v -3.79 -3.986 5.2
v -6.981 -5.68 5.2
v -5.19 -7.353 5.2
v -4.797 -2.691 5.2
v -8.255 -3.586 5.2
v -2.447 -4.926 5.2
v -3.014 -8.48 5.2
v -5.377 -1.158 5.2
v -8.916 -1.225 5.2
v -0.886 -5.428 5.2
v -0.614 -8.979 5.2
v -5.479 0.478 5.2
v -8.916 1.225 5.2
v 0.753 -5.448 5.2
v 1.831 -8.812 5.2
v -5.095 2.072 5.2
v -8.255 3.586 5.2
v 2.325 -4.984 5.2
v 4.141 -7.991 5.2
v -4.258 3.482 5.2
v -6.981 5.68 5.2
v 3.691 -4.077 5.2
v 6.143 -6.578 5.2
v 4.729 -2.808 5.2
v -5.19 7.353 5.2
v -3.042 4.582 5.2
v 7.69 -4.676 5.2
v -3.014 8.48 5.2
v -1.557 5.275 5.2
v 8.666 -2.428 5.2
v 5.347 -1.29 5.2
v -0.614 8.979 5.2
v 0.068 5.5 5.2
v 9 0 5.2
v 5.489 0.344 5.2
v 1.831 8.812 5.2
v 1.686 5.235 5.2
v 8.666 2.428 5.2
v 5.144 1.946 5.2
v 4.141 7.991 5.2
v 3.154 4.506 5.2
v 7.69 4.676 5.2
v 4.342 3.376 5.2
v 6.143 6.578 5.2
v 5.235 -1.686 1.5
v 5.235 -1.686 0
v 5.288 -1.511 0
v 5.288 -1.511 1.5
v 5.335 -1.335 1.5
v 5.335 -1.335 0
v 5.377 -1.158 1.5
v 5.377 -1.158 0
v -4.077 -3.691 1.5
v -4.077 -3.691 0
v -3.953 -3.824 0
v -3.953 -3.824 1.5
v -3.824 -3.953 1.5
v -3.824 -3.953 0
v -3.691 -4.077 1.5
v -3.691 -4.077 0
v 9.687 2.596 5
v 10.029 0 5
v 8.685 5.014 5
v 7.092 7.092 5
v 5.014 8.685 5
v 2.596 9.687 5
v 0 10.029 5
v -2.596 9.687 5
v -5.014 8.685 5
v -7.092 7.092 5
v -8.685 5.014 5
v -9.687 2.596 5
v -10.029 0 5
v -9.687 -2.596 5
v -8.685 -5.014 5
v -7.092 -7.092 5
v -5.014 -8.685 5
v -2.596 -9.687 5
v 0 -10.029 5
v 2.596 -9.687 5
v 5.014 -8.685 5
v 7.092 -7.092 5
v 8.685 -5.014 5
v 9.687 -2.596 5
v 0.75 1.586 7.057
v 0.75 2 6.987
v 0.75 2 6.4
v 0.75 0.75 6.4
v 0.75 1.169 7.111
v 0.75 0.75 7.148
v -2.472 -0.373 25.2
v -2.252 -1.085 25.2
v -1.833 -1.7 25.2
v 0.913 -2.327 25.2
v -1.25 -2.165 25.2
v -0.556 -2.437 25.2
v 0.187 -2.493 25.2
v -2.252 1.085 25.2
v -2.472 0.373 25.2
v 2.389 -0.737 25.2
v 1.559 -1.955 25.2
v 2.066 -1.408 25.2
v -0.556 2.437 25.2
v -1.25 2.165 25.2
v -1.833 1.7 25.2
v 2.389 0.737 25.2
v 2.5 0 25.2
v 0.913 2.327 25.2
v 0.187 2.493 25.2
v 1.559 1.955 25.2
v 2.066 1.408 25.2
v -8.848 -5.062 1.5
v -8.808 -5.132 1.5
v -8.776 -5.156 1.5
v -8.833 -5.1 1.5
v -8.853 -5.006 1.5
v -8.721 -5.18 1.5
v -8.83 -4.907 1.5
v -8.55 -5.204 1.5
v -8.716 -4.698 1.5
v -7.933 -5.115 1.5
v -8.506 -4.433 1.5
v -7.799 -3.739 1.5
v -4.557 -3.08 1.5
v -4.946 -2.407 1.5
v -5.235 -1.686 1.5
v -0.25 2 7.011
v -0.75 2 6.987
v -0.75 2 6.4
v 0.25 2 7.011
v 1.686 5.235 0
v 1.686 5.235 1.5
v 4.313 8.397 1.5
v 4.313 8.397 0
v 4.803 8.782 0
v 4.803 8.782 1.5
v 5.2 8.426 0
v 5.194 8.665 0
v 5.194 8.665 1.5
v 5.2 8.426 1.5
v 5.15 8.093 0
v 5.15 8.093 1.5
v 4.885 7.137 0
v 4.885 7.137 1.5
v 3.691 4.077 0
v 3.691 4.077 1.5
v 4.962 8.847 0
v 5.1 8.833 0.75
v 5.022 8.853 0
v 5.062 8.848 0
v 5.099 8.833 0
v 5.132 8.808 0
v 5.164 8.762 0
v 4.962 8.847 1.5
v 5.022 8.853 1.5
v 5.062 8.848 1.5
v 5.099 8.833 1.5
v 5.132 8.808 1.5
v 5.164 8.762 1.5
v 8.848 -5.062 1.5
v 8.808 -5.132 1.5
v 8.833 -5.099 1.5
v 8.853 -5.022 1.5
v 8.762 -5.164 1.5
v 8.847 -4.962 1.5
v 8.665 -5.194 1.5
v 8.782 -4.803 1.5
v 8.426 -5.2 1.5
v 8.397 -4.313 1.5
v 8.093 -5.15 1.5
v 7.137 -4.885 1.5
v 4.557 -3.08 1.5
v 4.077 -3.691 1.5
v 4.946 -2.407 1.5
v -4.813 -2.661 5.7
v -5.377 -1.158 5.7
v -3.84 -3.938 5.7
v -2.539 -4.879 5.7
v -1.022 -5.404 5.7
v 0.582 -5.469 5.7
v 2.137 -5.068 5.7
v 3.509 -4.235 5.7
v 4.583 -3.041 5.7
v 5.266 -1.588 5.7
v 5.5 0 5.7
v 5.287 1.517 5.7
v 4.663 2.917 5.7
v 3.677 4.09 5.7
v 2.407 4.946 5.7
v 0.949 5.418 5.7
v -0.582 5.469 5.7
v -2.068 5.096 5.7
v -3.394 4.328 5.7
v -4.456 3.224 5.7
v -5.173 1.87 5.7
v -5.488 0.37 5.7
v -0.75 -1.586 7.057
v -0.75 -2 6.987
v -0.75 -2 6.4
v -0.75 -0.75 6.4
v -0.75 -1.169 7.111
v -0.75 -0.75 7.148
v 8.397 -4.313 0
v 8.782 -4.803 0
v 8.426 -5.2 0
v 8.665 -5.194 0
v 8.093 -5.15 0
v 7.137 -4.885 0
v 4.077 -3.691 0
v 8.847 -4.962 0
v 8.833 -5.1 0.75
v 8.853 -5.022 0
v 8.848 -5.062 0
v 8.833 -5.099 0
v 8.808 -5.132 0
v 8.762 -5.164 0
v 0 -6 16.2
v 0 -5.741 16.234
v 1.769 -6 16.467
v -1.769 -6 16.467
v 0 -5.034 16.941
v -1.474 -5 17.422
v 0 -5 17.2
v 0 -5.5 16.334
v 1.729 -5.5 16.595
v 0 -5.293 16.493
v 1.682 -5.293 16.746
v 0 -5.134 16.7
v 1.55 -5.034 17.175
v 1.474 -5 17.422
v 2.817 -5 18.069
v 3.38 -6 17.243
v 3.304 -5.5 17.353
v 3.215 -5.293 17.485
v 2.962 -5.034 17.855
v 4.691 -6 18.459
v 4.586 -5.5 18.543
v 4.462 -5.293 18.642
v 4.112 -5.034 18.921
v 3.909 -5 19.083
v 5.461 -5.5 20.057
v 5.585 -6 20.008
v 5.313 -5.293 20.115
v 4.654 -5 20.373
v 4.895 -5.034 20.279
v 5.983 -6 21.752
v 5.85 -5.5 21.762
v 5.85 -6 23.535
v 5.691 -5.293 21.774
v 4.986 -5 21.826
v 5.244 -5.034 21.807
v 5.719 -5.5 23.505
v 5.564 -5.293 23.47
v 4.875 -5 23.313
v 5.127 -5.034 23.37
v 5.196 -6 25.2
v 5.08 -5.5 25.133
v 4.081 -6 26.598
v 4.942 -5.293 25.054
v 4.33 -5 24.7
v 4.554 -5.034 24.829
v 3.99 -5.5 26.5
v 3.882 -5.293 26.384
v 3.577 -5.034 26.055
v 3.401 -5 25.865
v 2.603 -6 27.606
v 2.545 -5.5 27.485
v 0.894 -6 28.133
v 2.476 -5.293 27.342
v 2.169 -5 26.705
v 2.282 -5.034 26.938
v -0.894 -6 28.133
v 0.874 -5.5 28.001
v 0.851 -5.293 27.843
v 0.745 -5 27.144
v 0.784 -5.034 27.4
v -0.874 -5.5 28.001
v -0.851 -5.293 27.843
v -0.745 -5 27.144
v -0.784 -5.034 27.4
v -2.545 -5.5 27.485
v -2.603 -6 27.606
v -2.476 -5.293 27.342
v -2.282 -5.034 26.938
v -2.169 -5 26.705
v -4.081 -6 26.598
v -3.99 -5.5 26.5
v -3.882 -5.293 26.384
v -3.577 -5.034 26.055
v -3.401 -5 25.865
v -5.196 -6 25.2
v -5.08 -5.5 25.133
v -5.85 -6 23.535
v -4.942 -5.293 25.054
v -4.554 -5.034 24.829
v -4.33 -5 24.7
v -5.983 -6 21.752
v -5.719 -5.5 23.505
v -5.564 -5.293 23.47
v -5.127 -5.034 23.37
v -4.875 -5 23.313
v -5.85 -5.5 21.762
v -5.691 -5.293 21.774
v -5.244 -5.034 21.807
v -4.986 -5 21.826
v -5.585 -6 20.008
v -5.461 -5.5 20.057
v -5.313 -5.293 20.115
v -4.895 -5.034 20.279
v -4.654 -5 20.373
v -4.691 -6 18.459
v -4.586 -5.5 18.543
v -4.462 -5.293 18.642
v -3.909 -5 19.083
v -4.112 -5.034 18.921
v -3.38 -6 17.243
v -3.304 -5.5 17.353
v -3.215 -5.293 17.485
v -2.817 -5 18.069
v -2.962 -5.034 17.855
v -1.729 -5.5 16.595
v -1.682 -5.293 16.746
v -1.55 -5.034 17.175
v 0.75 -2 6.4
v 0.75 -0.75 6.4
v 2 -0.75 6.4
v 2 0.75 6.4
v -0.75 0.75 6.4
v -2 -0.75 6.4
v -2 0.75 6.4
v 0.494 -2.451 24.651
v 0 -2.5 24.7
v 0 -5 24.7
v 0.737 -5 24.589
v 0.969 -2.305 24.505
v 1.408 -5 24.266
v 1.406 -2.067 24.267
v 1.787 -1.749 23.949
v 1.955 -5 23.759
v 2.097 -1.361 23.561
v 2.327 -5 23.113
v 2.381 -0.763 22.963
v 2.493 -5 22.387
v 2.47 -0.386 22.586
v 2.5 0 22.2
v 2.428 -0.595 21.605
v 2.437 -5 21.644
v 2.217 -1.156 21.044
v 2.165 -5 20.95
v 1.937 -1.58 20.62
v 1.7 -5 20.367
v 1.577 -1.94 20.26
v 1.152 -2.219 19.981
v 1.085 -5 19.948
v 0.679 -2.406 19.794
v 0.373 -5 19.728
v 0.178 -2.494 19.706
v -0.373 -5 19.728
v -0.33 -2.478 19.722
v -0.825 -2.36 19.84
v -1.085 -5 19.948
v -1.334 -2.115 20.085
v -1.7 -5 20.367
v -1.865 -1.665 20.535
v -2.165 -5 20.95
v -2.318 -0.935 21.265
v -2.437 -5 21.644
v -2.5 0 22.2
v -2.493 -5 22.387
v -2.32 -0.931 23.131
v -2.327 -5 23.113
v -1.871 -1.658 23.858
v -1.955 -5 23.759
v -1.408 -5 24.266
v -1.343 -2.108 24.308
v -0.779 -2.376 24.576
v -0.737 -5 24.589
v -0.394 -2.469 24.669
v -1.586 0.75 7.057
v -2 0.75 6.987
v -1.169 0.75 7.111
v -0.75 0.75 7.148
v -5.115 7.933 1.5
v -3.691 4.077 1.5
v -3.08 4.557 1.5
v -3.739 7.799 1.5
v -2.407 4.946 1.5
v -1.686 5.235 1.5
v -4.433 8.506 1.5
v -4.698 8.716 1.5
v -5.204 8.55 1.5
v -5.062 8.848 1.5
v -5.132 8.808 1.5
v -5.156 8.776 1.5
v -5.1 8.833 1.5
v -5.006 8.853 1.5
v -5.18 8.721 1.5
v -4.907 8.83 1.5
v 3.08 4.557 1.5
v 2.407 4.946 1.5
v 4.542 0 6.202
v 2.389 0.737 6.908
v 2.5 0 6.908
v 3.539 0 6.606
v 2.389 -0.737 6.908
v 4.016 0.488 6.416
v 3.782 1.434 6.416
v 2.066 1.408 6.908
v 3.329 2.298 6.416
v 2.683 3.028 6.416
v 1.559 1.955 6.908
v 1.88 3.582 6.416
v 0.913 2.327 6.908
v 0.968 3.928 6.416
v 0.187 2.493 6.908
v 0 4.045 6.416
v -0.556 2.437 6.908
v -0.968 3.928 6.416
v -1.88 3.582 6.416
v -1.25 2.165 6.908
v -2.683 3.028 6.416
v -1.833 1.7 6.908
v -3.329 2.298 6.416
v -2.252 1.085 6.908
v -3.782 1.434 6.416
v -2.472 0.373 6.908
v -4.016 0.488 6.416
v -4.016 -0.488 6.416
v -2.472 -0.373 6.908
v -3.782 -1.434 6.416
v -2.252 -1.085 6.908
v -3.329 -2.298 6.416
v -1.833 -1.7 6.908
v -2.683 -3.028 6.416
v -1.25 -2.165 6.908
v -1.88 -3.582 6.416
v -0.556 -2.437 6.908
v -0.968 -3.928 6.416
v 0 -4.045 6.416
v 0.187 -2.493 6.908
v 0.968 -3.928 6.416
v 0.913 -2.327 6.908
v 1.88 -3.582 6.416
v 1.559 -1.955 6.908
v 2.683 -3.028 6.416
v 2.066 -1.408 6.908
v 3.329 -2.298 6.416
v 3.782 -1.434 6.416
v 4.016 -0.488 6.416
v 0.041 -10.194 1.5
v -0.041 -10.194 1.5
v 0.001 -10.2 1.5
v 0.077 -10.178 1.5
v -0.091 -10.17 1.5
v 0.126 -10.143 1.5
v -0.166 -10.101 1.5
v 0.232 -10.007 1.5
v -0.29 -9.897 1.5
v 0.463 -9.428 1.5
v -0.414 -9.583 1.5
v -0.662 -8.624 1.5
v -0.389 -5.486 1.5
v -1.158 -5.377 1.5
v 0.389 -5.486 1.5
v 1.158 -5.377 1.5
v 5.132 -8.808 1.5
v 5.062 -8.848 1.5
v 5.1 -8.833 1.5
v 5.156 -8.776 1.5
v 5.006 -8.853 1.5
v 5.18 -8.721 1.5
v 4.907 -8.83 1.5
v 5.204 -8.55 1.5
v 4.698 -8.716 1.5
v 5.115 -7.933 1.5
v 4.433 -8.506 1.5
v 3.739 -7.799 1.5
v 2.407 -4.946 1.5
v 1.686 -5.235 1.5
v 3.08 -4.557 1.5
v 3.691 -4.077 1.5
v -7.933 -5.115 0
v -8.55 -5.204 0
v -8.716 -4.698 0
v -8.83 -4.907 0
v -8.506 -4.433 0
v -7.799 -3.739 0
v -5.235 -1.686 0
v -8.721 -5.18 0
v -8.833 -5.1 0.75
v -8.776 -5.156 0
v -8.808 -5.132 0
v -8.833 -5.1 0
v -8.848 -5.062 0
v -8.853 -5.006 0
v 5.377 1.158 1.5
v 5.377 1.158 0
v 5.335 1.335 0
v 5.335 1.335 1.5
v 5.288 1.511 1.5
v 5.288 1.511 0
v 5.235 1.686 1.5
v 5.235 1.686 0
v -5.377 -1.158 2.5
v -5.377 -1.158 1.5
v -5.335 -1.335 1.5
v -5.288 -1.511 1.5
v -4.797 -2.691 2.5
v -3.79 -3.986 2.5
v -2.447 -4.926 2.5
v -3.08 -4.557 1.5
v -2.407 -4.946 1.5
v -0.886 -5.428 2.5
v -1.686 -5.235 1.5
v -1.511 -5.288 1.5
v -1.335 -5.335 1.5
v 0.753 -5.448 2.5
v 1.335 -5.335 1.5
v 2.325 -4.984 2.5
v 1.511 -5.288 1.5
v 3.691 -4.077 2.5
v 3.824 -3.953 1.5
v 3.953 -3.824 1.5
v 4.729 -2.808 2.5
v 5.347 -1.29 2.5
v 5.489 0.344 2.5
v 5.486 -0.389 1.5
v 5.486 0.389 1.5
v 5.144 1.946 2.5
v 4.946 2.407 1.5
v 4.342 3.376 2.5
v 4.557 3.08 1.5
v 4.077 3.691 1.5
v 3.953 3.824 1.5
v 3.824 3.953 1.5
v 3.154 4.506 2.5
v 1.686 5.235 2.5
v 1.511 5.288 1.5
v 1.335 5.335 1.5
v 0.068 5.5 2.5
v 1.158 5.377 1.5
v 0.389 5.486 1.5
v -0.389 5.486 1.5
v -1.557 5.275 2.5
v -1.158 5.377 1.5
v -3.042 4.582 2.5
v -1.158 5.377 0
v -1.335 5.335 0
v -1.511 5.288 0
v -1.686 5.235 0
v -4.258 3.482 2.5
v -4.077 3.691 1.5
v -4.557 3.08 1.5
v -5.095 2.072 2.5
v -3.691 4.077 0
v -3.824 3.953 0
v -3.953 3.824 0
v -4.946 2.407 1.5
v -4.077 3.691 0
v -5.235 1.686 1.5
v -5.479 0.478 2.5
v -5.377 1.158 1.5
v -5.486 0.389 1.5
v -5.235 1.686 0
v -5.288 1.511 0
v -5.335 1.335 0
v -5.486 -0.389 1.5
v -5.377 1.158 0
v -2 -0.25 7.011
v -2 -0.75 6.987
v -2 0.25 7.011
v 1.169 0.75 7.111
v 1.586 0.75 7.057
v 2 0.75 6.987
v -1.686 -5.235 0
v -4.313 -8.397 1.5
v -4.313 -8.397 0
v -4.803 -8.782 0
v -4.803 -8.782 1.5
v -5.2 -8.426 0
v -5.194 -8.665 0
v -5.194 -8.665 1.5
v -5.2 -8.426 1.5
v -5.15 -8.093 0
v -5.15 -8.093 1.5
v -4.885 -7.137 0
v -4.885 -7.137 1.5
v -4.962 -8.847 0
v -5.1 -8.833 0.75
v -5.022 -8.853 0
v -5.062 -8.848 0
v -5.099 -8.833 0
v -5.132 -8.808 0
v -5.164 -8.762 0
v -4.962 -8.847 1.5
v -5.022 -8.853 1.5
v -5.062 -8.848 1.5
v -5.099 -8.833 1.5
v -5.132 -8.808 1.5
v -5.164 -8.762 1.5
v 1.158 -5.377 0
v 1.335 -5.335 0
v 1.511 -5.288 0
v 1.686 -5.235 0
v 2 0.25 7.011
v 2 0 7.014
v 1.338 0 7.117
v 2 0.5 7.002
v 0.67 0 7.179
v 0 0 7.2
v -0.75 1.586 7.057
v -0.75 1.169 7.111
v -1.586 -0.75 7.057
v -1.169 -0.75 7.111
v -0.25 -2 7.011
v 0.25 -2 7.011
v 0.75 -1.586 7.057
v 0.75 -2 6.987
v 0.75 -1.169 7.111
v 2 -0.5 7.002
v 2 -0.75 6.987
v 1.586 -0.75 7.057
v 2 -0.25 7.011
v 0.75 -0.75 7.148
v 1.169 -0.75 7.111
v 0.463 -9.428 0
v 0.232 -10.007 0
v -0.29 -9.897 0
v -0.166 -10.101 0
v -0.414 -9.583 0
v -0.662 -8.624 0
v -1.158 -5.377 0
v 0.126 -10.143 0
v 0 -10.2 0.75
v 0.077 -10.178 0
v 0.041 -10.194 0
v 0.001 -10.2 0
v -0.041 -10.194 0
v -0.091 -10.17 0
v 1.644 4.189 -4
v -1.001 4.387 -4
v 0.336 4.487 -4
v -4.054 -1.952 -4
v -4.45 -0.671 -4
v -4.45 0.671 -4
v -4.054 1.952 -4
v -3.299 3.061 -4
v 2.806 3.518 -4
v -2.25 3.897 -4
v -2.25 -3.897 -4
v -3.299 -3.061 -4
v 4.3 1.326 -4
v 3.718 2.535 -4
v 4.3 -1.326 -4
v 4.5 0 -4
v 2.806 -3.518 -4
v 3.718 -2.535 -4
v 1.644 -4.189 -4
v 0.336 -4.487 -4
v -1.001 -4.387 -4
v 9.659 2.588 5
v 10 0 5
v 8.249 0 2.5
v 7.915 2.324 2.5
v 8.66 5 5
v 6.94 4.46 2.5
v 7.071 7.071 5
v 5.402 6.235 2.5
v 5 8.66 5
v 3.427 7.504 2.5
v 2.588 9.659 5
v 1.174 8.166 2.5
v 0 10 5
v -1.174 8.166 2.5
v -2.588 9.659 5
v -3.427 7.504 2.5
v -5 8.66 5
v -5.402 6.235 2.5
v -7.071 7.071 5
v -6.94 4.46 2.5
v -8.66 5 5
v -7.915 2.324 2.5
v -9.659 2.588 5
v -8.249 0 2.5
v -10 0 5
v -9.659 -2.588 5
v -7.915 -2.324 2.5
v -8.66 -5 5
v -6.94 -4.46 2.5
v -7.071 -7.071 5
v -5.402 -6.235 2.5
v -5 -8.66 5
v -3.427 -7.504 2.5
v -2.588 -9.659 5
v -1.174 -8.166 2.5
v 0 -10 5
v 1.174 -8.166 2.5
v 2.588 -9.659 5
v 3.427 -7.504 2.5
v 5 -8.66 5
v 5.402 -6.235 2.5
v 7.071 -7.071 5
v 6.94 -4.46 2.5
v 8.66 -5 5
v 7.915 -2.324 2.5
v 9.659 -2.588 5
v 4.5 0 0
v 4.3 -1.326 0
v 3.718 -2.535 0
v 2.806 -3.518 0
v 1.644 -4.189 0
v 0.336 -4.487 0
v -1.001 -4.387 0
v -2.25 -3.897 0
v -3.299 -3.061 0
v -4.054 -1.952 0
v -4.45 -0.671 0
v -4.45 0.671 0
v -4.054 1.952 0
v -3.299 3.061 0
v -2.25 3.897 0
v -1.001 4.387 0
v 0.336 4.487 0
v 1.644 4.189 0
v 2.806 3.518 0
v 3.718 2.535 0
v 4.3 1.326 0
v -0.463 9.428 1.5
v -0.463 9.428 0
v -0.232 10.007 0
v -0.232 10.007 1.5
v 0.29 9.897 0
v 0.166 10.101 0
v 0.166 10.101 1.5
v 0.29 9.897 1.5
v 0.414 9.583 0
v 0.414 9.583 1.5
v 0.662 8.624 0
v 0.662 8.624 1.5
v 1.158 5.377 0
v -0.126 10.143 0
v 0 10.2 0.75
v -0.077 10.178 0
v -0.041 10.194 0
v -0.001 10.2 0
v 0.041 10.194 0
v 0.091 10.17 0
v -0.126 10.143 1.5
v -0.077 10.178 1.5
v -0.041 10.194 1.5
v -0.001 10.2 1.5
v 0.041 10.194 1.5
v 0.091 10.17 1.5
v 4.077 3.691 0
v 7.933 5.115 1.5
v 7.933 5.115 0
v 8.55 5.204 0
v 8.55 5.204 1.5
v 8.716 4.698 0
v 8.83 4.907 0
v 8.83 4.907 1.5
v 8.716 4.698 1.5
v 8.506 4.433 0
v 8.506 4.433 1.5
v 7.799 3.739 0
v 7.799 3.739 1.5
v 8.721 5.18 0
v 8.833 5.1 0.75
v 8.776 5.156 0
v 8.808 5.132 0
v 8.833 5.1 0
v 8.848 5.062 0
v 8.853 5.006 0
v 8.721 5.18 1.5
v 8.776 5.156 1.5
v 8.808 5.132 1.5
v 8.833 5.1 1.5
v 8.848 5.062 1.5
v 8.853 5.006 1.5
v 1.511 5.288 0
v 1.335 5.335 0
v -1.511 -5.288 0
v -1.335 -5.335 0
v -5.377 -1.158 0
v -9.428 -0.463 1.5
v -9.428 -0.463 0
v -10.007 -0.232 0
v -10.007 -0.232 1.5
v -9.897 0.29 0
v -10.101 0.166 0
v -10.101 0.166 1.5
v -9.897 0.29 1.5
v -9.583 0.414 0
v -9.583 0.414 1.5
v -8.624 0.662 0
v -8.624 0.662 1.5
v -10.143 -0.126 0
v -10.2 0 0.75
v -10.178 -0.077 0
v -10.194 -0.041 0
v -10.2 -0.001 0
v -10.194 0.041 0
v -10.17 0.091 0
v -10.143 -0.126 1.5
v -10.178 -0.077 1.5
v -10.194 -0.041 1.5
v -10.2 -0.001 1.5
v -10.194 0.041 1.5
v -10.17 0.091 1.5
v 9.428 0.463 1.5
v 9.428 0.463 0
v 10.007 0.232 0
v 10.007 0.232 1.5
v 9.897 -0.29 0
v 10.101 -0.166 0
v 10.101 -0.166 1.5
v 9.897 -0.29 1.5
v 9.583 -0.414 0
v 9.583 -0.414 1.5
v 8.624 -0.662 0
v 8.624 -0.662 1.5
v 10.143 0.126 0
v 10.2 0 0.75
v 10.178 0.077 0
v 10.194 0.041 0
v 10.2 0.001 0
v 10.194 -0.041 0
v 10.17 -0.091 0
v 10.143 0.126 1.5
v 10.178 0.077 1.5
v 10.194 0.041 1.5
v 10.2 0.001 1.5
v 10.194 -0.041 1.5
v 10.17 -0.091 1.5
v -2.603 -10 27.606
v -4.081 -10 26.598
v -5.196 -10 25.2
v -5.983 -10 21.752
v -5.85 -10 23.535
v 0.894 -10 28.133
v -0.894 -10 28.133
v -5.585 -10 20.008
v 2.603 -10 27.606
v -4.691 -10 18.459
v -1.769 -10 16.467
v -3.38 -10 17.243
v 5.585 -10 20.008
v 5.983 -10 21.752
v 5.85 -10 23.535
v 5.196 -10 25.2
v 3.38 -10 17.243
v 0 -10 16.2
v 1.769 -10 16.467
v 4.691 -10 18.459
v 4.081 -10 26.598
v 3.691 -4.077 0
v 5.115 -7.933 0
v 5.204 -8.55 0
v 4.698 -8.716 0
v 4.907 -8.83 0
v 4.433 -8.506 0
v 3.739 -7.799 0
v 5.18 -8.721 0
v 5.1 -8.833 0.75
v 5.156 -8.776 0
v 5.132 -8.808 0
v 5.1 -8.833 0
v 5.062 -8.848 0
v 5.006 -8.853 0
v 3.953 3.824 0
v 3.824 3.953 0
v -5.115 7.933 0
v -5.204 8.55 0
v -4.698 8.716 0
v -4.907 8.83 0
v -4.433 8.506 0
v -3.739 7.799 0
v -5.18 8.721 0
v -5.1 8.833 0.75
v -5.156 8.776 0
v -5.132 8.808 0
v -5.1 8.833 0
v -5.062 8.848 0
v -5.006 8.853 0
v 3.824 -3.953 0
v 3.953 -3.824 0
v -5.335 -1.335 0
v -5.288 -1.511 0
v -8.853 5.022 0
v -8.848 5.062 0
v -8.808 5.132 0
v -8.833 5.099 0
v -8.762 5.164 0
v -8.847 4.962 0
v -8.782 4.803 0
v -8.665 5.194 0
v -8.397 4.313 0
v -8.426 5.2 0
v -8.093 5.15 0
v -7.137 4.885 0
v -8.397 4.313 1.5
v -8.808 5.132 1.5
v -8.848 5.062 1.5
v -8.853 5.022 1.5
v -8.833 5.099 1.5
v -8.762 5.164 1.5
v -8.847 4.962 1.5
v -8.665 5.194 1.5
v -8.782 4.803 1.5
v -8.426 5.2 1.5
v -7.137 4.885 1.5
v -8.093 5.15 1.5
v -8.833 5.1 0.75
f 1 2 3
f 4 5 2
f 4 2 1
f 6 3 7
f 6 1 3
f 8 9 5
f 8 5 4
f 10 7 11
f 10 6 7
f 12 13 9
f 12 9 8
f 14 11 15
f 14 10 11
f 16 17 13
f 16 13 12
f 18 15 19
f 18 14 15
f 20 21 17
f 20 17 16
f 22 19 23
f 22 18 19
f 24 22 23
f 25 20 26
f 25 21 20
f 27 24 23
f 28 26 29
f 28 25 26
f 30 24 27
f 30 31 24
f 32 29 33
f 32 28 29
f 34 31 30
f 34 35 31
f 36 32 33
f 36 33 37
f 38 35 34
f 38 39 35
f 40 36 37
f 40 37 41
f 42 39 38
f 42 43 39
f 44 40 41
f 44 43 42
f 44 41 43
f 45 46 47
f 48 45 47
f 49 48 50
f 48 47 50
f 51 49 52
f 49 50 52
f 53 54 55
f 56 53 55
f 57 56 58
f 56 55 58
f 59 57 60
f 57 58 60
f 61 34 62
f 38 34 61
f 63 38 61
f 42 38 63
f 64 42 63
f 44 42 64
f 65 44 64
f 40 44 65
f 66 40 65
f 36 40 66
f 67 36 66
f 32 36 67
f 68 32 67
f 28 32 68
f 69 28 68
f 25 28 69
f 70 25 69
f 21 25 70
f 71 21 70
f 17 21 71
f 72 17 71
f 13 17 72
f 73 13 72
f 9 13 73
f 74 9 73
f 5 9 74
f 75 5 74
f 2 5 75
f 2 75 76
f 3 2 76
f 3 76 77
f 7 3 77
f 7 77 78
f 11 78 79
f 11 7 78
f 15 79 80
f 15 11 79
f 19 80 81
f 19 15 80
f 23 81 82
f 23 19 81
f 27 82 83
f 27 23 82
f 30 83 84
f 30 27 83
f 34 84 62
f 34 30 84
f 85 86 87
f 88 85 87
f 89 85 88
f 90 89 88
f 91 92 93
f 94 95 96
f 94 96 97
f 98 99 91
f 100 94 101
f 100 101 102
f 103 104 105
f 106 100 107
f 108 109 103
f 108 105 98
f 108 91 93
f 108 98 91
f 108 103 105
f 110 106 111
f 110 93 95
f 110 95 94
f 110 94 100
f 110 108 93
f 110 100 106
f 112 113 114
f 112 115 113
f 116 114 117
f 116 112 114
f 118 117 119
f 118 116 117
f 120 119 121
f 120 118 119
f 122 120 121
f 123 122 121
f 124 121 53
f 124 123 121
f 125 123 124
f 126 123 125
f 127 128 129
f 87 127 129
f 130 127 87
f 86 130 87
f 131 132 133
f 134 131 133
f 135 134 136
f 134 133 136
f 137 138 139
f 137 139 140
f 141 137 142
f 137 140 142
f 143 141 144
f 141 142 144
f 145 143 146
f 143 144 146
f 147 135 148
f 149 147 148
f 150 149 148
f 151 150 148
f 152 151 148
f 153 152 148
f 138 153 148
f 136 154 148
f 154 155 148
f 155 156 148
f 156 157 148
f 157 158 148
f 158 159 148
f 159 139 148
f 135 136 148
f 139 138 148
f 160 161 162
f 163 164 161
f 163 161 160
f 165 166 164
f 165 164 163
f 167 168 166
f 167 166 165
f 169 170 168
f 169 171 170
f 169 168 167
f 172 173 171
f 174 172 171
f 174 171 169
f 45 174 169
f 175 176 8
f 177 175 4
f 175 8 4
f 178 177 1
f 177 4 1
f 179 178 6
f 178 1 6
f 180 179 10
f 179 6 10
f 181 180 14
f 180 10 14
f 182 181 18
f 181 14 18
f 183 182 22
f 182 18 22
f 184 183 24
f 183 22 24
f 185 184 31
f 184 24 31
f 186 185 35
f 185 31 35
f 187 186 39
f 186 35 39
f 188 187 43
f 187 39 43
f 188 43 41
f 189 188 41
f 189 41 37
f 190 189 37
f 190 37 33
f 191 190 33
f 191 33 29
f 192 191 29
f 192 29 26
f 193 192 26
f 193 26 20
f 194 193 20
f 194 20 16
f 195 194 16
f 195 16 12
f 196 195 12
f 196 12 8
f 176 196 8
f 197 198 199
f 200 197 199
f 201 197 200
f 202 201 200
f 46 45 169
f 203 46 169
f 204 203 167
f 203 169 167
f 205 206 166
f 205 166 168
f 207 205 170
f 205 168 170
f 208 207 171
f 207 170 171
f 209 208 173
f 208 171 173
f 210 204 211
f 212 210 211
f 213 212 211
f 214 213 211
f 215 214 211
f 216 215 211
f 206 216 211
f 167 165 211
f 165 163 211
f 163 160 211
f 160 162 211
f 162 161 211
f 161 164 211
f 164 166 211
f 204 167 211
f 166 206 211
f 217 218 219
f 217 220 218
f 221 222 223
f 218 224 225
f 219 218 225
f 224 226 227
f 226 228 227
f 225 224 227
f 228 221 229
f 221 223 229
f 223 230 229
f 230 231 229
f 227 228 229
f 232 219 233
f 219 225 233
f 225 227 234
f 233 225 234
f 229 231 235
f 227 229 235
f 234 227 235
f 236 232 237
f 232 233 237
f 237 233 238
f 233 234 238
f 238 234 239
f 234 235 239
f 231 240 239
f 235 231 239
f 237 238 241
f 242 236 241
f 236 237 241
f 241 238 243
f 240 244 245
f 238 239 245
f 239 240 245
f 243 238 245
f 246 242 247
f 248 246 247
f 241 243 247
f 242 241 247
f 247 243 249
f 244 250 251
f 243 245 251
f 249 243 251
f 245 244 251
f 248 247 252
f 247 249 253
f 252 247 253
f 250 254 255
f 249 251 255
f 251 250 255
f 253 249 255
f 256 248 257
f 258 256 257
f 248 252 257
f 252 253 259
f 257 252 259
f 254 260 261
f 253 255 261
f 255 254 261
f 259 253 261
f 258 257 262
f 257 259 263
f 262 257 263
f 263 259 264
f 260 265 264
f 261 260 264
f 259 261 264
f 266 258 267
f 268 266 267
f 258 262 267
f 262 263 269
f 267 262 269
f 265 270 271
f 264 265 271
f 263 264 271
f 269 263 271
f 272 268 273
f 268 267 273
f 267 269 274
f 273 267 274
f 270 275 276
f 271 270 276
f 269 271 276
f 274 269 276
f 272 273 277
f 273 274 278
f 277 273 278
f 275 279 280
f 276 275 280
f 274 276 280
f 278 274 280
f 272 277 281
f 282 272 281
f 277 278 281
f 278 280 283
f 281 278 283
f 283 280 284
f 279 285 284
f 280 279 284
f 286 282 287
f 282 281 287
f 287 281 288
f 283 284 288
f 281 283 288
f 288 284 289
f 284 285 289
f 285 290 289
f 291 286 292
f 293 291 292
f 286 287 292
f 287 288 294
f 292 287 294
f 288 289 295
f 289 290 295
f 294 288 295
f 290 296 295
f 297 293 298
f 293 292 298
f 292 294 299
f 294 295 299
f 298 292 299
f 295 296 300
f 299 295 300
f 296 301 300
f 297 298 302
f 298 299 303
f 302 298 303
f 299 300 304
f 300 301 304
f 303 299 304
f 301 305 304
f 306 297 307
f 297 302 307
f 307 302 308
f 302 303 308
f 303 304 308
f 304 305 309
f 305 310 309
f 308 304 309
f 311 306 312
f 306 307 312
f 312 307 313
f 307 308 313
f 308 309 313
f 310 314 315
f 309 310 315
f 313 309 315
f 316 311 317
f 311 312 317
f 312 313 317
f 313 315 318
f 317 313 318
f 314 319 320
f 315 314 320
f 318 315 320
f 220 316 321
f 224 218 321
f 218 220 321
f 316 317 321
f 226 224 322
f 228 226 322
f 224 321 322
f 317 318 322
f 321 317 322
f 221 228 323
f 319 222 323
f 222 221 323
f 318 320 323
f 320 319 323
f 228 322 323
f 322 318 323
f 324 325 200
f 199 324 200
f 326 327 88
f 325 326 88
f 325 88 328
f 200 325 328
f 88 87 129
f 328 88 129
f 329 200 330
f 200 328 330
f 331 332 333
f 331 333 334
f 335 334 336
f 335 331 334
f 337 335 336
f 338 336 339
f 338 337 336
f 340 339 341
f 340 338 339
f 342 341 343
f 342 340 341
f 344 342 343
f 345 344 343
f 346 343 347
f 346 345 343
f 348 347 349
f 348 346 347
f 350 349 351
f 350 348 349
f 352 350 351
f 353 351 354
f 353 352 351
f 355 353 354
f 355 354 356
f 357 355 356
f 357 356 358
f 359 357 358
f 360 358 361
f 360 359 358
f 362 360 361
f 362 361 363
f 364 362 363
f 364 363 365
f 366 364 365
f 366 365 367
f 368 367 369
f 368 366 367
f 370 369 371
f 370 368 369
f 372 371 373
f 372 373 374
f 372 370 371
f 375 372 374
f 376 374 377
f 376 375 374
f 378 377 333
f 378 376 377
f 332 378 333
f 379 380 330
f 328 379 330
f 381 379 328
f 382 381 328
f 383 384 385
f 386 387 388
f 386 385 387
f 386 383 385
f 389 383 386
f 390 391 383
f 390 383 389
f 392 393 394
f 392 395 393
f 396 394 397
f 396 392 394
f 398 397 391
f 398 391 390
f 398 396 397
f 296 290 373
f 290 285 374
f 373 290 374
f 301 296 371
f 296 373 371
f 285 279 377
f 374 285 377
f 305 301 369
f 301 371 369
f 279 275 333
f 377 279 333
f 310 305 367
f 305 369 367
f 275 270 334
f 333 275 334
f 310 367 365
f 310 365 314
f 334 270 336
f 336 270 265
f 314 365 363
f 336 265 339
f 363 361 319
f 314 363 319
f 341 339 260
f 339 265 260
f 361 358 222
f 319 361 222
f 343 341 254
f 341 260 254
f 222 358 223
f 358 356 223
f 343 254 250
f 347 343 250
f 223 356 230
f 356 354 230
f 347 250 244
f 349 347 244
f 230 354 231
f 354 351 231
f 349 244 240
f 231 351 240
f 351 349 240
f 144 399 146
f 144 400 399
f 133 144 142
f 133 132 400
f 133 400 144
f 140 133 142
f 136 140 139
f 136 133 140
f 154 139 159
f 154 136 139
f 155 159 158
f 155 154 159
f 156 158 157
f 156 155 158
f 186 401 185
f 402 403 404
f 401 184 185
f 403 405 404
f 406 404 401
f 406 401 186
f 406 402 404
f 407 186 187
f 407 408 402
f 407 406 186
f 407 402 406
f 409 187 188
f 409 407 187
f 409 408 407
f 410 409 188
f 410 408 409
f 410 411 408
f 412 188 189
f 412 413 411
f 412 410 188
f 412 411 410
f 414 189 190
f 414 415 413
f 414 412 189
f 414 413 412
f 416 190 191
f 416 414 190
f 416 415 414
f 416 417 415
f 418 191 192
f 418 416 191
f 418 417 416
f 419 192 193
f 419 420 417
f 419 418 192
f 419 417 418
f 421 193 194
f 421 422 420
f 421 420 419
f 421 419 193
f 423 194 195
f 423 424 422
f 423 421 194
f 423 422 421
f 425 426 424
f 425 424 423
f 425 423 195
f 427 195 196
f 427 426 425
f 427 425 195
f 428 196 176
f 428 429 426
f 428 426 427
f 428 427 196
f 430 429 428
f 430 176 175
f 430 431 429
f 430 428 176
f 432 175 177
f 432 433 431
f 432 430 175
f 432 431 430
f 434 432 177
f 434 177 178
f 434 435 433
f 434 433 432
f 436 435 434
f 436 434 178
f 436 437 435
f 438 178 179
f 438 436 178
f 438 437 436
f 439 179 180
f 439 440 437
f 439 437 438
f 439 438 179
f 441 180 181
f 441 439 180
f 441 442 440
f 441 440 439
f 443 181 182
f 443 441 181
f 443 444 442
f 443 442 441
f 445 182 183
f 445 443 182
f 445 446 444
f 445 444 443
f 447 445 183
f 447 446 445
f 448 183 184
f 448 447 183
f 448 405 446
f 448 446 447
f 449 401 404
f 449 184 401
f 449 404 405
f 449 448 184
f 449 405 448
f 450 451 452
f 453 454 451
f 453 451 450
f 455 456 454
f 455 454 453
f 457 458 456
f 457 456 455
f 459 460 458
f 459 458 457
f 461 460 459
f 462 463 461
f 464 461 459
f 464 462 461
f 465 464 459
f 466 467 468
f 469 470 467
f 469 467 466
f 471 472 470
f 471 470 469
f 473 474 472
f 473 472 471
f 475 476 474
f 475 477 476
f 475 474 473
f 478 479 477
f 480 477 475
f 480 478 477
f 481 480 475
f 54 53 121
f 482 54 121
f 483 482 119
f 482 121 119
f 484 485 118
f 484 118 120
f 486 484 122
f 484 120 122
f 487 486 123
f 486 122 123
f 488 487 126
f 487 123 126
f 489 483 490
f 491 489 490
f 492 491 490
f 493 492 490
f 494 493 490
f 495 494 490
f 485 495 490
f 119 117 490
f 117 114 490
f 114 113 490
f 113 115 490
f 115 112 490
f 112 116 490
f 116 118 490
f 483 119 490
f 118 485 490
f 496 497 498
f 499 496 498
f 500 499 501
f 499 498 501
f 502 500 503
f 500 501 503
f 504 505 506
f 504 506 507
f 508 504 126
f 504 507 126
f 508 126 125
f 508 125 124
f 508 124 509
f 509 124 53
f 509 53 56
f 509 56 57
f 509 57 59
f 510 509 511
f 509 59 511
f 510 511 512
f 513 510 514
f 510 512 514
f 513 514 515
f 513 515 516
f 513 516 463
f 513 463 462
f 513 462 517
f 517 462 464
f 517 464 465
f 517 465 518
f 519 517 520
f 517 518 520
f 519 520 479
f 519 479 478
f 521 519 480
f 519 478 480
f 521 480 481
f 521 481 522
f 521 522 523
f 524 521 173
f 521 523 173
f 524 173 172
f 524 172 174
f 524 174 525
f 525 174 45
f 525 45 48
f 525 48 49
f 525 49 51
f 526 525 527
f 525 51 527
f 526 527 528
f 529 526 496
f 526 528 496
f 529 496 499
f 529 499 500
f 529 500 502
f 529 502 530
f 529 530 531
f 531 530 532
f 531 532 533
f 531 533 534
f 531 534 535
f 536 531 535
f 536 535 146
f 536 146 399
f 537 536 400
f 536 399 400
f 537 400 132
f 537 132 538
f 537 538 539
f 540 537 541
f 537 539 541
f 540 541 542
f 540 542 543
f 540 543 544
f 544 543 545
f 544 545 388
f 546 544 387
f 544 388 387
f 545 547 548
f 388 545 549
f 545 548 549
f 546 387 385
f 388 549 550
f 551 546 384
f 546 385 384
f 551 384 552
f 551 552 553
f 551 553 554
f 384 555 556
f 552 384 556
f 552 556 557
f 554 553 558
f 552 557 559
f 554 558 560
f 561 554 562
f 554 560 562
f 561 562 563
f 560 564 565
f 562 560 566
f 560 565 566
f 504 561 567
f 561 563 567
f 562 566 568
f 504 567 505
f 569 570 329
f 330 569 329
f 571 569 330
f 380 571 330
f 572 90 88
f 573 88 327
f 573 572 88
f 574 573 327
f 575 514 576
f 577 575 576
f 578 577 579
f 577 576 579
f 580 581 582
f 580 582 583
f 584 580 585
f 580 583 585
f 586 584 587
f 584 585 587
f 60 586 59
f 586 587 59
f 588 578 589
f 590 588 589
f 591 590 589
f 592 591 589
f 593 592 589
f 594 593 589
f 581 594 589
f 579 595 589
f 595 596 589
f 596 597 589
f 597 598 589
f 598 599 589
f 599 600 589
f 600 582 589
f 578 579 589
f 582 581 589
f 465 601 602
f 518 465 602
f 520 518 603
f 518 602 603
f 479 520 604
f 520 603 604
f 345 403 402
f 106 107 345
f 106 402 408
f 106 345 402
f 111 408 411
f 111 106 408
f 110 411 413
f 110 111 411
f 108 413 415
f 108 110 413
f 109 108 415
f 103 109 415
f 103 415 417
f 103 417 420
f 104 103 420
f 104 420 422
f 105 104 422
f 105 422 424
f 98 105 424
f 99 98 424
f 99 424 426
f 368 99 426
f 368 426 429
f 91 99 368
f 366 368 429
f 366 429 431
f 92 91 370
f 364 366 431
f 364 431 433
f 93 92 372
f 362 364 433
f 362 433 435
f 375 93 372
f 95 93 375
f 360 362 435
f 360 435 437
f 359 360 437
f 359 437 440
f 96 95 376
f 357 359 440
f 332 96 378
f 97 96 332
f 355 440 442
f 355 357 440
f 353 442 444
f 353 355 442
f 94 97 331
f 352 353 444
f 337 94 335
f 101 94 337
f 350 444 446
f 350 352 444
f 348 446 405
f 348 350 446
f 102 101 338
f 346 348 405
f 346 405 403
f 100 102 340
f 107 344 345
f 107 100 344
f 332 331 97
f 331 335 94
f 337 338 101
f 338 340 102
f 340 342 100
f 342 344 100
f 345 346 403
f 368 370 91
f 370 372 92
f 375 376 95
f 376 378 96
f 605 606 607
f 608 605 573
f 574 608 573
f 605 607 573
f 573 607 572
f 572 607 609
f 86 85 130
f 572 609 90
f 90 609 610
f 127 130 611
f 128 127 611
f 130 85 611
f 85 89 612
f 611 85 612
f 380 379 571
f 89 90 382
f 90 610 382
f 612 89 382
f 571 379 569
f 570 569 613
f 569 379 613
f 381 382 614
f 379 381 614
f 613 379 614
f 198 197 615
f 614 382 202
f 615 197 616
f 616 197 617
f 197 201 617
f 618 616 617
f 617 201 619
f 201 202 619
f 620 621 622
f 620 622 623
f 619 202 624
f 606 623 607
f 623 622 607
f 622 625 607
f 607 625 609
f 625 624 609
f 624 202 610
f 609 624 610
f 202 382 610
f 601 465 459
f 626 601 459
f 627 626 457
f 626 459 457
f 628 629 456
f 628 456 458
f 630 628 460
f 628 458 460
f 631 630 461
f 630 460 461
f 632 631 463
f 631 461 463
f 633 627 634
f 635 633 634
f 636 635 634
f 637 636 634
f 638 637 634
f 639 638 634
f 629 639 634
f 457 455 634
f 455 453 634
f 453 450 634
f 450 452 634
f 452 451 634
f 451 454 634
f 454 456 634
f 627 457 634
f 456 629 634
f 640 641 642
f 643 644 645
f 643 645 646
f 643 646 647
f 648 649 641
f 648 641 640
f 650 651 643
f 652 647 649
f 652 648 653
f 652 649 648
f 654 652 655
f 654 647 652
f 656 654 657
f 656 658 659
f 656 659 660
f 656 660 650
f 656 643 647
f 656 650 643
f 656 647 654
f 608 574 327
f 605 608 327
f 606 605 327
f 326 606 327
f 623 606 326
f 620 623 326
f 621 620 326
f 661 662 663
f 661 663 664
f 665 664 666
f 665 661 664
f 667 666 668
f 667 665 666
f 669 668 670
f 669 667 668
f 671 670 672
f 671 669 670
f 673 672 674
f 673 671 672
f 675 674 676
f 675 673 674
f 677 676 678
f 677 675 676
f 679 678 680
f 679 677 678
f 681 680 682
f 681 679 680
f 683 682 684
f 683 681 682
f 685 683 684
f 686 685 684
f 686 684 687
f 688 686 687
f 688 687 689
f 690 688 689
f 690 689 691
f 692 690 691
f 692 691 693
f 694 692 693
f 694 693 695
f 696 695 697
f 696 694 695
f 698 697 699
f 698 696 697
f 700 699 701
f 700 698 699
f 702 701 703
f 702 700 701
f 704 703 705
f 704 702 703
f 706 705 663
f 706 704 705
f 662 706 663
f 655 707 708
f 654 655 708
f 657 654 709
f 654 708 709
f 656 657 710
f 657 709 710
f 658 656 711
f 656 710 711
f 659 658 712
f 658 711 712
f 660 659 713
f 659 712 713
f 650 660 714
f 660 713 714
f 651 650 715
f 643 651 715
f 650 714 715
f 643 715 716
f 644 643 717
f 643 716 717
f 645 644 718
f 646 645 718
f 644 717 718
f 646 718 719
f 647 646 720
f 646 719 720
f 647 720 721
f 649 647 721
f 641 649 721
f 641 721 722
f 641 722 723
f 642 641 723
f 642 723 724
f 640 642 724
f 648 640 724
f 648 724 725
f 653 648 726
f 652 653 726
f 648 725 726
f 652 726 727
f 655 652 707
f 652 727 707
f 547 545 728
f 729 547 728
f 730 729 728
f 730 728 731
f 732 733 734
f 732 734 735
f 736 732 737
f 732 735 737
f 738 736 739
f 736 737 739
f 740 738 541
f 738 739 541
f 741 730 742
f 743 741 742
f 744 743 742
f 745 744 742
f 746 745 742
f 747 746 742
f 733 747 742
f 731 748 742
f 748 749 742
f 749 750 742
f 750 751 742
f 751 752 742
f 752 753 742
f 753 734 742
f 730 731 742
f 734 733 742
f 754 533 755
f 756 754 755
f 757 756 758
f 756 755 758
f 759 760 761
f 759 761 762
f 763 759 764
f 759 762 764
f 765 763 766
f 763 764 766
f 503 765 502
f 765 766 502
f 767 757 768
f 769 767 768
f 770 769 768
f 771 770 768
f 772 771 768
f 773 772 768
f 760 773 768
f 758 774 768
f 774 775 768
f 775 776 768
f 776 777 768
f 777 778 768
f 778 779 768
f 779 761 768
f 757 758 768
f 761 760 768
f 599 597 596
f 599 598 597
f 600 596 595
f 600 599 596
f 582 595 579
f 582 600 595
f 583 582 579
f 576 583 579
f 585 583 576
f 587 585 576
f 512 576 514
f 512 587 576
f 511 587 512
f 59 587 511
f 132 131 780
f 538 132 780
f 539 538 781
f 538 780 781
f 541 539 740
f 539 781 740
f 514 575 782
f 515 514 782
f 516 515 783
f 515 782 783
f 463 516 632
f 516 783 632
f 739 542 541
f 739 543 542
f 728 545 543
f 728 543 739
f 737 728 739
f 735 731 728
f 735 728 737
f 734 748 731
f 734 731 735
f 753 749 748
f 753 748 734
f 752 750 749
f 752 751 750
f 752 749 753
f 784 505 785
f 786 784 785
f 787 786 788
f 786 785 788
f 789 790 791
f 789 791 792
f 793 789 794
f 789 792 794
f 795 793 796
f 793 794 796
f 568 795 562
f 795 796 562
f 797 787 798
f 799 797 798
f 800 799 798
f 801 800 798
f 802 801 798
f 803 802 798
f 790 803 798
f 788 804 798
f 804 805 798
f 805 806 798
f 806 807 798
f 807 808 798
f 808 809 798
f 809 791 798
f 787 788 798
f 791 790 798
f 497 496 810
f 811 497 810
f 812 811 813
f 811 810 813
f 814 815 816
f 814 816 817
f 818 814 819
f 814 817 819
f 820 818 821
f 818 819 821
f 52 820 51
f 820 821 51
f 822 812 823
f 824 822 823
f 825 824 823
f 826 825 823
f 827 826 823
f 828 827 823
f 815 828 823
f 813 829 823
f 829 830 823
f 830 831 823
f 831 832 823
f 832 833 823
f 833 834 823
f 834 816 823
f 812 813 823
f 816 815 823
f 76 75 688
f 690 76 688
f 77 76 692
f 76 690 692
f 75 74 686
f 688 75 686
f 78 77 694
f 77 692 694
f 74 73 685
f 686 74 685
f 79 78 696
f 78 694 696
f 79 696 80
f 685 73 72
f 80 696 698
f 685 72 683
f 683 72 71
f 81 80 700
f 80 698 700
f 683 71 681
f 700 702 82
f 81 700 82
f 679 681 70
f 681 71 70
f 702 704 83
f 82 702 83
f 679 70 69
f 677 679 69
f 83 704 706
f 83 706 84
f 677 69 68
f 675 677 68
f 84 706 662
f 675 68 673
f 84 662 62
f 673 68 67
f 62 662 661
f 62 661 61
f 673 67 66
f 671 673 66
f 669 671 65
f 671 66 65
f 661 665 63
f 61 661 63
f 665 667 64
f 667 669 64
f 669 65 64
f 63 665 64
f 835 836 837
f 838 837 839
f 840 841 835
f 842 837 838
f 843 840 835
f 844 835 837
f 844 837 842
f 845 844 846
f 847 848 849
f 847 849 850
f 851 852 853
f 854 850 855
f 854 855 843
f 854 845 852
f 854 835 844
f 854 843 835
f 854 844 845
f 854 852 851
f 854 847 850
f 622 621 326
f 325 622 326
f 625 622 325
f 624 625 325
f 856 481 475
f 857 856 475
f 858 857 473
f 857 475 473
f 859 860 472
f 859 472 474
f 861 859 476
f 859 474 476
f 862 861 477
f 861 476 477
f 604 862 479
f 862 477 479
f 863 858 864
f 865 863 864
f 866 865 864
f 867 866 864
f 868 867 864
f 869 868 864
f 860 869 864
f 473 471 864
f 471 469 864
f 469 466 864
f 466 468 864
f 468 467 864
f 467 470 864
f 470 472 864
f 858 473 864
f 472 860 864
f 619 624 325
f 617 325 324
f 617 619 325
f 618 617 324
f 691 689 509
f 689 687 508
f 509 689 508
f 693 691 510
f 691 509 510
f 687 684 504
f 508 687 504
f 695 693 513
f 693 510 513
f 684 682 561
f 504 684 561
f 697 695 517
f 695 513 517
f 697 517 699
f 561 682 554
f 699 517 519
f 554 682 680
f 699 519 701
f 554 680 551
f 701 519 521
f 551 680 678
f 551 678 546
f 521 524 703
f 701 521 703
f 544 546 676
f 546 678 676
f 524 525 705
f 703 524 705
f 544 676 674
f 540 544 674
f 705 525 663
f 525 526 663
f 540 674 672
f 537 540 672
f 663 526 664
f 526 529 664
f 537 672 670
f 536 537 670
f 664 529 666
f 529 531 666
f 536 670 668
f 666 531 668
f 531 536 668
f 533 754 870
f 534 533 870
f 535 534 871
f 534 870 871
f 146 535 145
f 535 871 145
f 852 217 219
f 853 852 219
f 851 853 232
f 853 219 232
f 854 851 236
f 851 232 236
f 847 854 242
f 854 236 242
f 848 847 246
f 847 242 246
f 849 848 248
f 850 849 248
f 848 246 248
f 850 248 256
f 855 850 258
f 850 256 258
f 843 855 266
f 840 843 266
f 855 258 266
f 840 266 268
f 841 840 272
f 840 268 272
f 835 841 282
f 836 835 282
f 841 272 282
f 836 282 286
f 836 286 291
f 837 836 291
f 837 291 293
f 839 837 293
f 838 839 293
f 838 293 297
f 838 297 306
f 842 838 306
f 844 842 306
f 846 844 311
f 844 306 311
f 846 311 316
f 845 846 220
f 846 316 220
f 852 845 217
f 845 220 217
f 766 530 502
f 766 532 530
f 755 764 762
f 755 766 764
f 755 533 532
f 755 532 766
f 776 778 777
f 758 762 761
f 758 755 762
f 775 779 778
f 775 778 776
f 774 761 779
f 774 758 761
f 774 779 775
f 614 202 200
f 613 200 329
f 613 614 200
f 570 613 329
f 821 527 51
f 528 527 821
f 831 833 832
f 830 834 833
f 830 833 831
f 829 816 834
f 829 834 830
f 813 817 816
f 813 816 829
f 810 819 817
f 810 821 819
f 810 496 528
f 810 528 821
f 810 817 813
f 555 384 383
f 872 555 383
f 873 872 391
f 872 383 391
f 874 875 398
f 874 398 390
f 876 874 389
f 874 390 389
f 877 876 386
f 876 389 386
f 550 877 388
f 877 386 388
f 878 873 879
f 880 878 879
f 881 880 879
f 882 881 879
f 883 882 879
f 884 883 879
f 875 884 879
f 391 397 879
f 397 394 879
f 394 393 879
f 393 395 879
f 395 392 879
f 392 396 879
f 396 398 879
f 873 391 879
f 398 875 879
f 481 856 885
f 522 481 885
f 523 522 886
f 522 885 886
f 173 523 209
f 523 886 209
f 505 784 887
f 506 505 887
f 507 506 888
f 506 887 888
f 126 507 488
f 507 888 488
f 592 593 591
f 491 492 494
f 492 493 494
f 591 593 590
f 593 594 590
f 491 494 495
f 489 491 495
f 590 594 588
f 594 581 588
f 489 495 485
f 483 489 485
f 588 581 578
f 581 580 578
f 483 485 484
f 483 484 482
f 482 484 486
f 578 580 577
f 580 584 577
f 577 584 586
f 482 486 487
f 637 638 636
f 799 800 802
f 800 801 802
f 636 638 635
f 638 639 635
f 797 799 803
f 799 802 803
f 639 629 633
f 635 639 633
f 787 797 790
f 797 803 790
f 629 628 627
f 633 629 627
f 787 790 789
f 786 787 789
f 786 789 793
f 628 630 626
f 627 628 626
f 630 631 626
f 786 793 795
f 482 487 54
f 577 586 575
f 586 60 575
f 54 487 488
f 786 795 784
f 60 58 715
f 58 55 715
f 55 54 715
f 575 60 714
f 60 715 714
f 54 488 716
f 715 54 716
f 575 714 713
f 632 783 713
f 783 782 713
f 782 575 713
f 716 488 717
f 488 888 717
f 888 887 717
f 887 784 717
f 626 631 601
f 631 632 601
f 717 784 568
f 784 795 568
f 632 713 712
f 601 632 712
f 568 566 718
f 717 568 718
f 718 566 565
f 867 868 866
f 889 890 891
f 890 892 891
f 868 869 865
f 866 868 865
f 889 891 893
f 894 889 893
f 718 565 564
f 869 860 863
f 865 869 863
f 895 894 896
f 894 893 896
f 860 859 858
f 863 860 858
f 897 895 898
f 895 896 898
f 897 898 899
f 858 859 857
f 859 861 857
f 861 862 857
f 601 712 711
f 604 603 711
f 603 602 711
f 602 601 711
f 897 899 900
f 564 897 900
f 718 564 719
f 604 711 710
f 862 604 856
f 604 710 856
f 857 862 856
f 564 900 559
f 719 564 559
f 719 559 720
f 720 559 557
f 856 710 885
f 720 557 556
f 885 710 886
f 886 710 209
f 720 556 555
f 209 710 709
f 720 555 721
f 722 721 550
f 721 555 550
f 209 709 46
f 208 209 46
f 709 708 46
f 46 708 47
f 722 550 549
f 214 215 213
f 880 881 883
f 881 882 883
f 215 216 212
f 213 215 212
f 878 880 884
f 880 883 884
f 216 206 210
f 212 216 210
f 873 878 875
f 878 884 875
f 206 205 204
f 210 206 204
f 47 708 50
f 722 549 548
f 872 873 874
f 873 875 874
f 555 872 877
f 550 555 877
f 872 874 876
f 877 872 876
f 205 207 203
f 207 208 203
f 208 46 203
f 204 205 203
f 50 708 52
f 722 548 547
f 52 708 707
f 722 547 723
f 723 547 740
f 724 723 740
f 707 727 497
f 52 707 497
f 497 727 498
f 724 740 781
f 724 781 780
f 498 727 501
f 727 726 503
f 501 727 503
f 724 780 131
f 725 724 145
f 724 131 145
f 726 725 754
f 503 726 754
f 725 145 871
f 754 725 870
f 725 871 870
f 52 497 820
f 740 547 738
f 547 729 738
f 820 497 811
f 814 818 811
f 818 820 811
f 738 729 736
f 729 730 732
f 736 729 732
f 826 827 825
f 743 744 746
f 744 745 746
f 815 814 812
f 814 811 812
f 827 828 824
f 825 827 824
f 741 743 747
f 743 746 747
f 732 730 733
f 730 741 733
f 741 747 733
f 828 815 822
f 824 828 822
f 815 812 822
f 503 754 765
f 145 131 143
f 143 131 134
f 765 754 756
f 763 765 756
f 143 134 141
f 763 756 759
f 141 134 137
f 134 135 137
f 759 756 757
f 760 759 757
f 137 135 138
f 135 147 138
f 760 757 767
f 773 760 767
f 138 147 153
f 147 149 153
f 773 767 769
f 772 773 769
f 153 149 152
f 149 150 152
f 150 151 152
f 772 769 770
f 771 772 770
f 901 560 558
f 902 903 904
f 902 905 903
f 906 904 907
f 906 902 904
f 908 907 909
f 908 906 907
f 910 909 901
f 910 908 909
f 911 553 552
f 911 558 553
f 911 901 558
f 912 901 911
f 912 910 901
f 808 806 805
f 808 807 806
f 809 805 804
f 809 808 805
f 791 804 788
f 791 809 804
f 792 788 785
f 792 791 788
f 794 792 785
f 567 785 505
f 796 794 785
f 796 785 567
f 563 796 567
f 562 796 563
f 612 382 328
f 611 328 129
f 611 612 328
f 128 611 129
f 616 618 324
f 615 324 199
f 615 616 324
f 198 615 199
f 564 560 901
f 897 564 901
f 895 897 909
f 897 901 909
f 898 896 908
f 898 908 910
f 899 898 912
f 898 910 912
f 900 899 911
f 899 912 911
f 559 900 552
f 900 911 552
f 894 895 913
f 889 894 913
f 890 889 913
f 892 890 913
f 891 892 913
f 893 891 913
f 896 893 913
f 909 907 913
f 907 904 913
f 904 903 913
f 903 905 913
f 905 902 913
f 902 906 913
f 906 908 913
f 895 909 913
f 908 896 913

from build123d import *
from build123d.topology import SkipClean

# Parameters (mm, degrees)
SKETCH1_R                = 5.5
GEARPLATE_DEPTH          = 1.5
BOSS_EXTRUDE3_DEPTH      = 1.5
CIRPATTERN2_COUNT        = 12
SKETCH3_R                = 4.5
BACKPLATE_DEPTH          = 4
SKETCH4_R                = 5.5
PLATE_DEPTH              = 1
SKETCH6_R                = 10
ANGLEPLATE_DEPTH         = 2.5
ANGLEPLATE_DRAFT         = -35
SKETCH8_R                = 9
SMALLANGLEPLATE_DEPTH    = 0.2
SMALLANGLEPLATE_DRAFT    = 79
SKETCH9_R                = 5.5
DOMEEXTRUDE_DEPTH        = 0.5
CUT_EXTRUDE1_DEPTH       = 3.8
BOSS_EXTRUDE5_REACH      = 34.569
BOSS_EXTRUDE5_END_RADIUS = 10.833333333
SKETCH12_R               = 2.5
SKETCH15_R               = 2.5
BOSS_EXTRUDE6_DEPTH      = 5
SKETCH16_R               = 6
BOSS_EXTRUDE7_DEPTH      = 5
FILLET1_R                = 1


# Read off the part's stored shape, not the designer's step: Dome1
with BuildPart() as part:
    # Sketch1 → GearPlate (new body)
    with BuildSketch(Plane.XY):
        Circle(SKETCH1_R)
    extrude(amount=GEARPLATE_DEPTH)

    # Sketch2 → Boss-Extrude3 (add)
    with BuildSketch(Plane.XY.offset(1.5)):
        with BuildLine():
            Line((-1.157942076, 5.376724853), (1.157942076, 5.376724853))
            add(Edge.make_bspline(
                [(-1.157942076, 5.376724853), (0, 15.022701543), (1.157942076, 5.376724853)],
                knots=[0, 0, 0, 1, 1, 1], degree=2))
        make_face()
    boss_extrude3 = extrude(amount=-BOSS_EXTRUDE3_DEPTH)

    # CirPattern2: Boss-Extrude3 ×12 about axis
    cirpattern2_axis = Axis((0, 0, 1.5), (0, 0, -1))
    for i in range(1, CIRPATTERN2_COUNT):
        add(boss_extrude3.rotate(cirpattern2_axis, i * 360 / CIRPATTERN2_COUNT))

    # Sketch3 → BackPlate (add)
    with BuildSketch(Plane(origin=(0, 0, 0), x_dir=(-1, 0, 0), z_dir=(0, 0, -1))):
        with Locations(Location((0, 0, 0), (0, 0, 180))):
            Circle(SKETCH3_R)
    extrude(amount=BACKPLATE_DEPTH)

    # Sketch4 → Plate (add)
    with BuildSketch(Plane.XY.offset(1.5)):
        with Locations(Location((0, 0, 0), (0, 0, 192.153701922))):
            Circle(SKETCH4_R)
    extrude(amount=PLATE_DEPTH)


with BuildPart() as angleplate_tool:
    # Sketch6 → AnglePlate (with draft: the straight prism first)
    with BuildSketch(Plane.XY.offset(5)):
        Circle(SKETCH6_R)
    extrude(amount=-ANGLEPLATE_DEPTH)
    # AnglePlate: the draft: its side faces are tilted about the plane it starts from
    angleplate_sides = [angleplate_tool.faces().sort_by_distance(p)[0] for p in [
        (-10, 0, 3.75),
    ]]
    draft(angleplate_sides, Plane.XY.offset(5), ANGLEPLATE_DRAFT)


with BuildPart() as part_1:
    add(part.part)

    # AnglePlate: add angleplate_tool
    add(angleplate_tool.part)


with BuildPart() as smallangleplate_tool:
    # Sketch8 → SmallAnglePlate (with draft: the straight prism first)
    with BuildSketch(Plane.XY.offset(5.2)):
        Circle(SKETCH8_R)
    extrude(amount=-SMALLANGLEPLATE_DEPTH)
    # SmallAnglePlate: the draft: its side faces are tilted about the plane it starts from
    smallangleplate_sides = [smallangleplate_tool.faces().sort_by_distance(p)[0] for p in [
        (-9, 0, 5.1),
    ]]
    draft(smallangleplate_sides, Plane.XY.offset(5.2), SMALLANGLEPLATE_DRAFT)


with BuildPart() as part_2:
    add(part_1.part)

    # SmallAnglePlate: add smallangleplate_tool
    add(smallangleplate_tool.part)

    # Sketch9 → DomeExtrude (add)
    with SkipClean():  # the faces are left unmerged after this step: merging them gives an invalid solid
        with BuildSketch(Plane.XY.offset(5.2)):
            with Locations(Location((0, 0, 0), (0, 0, 192.153701922))):
                Circle(SKETCH9_R)
        extrude(amount=DOMEEXTRUDE_DEPTH)

    # Dome1 outline → Dome1 (revolve)
    with SkipClean():  # the faces are left unmerged after this step: merging them gives an invalid solid
        with BuildSketch(Plane.XZ):
            with BuildLine():
                Line((0, 5.7), (5.500000009, 5.699999994))
                ThreePointArc((5.500000009, 5.699999994), (2.850438568, 6.818274729), (0, 7.2))
                Line((0, 7.2), (0, 5.7))
            make_face()
        revolve(axis=Axis((0, 0, 0), (0, 0, 1)))

    # Sketch11 → Cut-Extrude1 (cut)
    with SkipClean():  # the faces are left unmerged after this step: merging them gives an invalid solid
        with BuildSketch(Plane.XY.offset(10.2)):
            Polygon((-0.75, 2), (0.75, 2), (0.75, 0.75), (2, 0.75), (2, -0.75), (0.75, -0.75), (0.75, -2), (-0.75, -2), (-0.75, -0.75), (-2, -0.75), (-2, 0.75), (-0.75, 0.75), align=None)
        extrude(amount=-CUT_EXTRUDE1_DEPTH, mode=Mode.SUBTRACT)

    # Boss-Extrude5: up to this sphere (the profile starts outside it)
    with SkipClean():  # the faces are left unmerged after this step: merging them gives an invalid solid
        boss_extrude5_end = Location((0, 0, -3.633333333)) * Sphere(BOSS_EXTRUDE5_END_RADIUS, mode=Mode.PRIVATE)
        # Sketch12 → Boss-Extrude5 (add, up to the surface)
        with BuildSketch(Plane.XY.offset(25.2), mode=Mode.PRIVATE) as boss_extrude5_sk1:
            Circle(SKETCH12_R)
        boss_extrude5_tool1 = extrude(boss_extrude5_sk1.sketch, amount=-BOSS_EXTRUDE5_REACH, mode=Mode.PRIVATE) - boss_extrude5_end
        add(boss_extrude5_tool1.solids().sort_by_distance((0, 0, 25.2))[0])

    # Sketch15 → Boss-Extrude6 (add)
    with SkipClean():  # the faces are left unmerged after this step: merging them gives an invalid solid
        with BuildSketch(Plane(origin=(0, 0, 0), x_dir=(1, 0, 0), z_dir=(0, 1, 0))):
            with Locations(Location((0, -22.2, 0), (0, 0, 270))):
                Circle(SKETCH15_R)
        extrude(amount=-BOSS_EXTRUDE6_DEPTH)

    # Sketch16 → Boss-Extrude7 (add)
    with SkipClean():  # the faces are left unmerged after this step: merging them gives an invalid solid
        with BuildSketch(Plane.XZ.offset(5)):
            with Locations(Location((0, 22.2, 0), (0, 0, 270))):
                Circle(SKETCH16_R)
        extrude(amount=BOSS_EXTRUDE7_DEPTH)

    # Fillet1
    fillet1_edges = [part_2.edges().sort_by_distance(p)[0] for p in [
        (0, -5, 28.2),
    ]]
    fillet(fillet1_edges, radius=FILLET1_R)


solid = part_2.part
